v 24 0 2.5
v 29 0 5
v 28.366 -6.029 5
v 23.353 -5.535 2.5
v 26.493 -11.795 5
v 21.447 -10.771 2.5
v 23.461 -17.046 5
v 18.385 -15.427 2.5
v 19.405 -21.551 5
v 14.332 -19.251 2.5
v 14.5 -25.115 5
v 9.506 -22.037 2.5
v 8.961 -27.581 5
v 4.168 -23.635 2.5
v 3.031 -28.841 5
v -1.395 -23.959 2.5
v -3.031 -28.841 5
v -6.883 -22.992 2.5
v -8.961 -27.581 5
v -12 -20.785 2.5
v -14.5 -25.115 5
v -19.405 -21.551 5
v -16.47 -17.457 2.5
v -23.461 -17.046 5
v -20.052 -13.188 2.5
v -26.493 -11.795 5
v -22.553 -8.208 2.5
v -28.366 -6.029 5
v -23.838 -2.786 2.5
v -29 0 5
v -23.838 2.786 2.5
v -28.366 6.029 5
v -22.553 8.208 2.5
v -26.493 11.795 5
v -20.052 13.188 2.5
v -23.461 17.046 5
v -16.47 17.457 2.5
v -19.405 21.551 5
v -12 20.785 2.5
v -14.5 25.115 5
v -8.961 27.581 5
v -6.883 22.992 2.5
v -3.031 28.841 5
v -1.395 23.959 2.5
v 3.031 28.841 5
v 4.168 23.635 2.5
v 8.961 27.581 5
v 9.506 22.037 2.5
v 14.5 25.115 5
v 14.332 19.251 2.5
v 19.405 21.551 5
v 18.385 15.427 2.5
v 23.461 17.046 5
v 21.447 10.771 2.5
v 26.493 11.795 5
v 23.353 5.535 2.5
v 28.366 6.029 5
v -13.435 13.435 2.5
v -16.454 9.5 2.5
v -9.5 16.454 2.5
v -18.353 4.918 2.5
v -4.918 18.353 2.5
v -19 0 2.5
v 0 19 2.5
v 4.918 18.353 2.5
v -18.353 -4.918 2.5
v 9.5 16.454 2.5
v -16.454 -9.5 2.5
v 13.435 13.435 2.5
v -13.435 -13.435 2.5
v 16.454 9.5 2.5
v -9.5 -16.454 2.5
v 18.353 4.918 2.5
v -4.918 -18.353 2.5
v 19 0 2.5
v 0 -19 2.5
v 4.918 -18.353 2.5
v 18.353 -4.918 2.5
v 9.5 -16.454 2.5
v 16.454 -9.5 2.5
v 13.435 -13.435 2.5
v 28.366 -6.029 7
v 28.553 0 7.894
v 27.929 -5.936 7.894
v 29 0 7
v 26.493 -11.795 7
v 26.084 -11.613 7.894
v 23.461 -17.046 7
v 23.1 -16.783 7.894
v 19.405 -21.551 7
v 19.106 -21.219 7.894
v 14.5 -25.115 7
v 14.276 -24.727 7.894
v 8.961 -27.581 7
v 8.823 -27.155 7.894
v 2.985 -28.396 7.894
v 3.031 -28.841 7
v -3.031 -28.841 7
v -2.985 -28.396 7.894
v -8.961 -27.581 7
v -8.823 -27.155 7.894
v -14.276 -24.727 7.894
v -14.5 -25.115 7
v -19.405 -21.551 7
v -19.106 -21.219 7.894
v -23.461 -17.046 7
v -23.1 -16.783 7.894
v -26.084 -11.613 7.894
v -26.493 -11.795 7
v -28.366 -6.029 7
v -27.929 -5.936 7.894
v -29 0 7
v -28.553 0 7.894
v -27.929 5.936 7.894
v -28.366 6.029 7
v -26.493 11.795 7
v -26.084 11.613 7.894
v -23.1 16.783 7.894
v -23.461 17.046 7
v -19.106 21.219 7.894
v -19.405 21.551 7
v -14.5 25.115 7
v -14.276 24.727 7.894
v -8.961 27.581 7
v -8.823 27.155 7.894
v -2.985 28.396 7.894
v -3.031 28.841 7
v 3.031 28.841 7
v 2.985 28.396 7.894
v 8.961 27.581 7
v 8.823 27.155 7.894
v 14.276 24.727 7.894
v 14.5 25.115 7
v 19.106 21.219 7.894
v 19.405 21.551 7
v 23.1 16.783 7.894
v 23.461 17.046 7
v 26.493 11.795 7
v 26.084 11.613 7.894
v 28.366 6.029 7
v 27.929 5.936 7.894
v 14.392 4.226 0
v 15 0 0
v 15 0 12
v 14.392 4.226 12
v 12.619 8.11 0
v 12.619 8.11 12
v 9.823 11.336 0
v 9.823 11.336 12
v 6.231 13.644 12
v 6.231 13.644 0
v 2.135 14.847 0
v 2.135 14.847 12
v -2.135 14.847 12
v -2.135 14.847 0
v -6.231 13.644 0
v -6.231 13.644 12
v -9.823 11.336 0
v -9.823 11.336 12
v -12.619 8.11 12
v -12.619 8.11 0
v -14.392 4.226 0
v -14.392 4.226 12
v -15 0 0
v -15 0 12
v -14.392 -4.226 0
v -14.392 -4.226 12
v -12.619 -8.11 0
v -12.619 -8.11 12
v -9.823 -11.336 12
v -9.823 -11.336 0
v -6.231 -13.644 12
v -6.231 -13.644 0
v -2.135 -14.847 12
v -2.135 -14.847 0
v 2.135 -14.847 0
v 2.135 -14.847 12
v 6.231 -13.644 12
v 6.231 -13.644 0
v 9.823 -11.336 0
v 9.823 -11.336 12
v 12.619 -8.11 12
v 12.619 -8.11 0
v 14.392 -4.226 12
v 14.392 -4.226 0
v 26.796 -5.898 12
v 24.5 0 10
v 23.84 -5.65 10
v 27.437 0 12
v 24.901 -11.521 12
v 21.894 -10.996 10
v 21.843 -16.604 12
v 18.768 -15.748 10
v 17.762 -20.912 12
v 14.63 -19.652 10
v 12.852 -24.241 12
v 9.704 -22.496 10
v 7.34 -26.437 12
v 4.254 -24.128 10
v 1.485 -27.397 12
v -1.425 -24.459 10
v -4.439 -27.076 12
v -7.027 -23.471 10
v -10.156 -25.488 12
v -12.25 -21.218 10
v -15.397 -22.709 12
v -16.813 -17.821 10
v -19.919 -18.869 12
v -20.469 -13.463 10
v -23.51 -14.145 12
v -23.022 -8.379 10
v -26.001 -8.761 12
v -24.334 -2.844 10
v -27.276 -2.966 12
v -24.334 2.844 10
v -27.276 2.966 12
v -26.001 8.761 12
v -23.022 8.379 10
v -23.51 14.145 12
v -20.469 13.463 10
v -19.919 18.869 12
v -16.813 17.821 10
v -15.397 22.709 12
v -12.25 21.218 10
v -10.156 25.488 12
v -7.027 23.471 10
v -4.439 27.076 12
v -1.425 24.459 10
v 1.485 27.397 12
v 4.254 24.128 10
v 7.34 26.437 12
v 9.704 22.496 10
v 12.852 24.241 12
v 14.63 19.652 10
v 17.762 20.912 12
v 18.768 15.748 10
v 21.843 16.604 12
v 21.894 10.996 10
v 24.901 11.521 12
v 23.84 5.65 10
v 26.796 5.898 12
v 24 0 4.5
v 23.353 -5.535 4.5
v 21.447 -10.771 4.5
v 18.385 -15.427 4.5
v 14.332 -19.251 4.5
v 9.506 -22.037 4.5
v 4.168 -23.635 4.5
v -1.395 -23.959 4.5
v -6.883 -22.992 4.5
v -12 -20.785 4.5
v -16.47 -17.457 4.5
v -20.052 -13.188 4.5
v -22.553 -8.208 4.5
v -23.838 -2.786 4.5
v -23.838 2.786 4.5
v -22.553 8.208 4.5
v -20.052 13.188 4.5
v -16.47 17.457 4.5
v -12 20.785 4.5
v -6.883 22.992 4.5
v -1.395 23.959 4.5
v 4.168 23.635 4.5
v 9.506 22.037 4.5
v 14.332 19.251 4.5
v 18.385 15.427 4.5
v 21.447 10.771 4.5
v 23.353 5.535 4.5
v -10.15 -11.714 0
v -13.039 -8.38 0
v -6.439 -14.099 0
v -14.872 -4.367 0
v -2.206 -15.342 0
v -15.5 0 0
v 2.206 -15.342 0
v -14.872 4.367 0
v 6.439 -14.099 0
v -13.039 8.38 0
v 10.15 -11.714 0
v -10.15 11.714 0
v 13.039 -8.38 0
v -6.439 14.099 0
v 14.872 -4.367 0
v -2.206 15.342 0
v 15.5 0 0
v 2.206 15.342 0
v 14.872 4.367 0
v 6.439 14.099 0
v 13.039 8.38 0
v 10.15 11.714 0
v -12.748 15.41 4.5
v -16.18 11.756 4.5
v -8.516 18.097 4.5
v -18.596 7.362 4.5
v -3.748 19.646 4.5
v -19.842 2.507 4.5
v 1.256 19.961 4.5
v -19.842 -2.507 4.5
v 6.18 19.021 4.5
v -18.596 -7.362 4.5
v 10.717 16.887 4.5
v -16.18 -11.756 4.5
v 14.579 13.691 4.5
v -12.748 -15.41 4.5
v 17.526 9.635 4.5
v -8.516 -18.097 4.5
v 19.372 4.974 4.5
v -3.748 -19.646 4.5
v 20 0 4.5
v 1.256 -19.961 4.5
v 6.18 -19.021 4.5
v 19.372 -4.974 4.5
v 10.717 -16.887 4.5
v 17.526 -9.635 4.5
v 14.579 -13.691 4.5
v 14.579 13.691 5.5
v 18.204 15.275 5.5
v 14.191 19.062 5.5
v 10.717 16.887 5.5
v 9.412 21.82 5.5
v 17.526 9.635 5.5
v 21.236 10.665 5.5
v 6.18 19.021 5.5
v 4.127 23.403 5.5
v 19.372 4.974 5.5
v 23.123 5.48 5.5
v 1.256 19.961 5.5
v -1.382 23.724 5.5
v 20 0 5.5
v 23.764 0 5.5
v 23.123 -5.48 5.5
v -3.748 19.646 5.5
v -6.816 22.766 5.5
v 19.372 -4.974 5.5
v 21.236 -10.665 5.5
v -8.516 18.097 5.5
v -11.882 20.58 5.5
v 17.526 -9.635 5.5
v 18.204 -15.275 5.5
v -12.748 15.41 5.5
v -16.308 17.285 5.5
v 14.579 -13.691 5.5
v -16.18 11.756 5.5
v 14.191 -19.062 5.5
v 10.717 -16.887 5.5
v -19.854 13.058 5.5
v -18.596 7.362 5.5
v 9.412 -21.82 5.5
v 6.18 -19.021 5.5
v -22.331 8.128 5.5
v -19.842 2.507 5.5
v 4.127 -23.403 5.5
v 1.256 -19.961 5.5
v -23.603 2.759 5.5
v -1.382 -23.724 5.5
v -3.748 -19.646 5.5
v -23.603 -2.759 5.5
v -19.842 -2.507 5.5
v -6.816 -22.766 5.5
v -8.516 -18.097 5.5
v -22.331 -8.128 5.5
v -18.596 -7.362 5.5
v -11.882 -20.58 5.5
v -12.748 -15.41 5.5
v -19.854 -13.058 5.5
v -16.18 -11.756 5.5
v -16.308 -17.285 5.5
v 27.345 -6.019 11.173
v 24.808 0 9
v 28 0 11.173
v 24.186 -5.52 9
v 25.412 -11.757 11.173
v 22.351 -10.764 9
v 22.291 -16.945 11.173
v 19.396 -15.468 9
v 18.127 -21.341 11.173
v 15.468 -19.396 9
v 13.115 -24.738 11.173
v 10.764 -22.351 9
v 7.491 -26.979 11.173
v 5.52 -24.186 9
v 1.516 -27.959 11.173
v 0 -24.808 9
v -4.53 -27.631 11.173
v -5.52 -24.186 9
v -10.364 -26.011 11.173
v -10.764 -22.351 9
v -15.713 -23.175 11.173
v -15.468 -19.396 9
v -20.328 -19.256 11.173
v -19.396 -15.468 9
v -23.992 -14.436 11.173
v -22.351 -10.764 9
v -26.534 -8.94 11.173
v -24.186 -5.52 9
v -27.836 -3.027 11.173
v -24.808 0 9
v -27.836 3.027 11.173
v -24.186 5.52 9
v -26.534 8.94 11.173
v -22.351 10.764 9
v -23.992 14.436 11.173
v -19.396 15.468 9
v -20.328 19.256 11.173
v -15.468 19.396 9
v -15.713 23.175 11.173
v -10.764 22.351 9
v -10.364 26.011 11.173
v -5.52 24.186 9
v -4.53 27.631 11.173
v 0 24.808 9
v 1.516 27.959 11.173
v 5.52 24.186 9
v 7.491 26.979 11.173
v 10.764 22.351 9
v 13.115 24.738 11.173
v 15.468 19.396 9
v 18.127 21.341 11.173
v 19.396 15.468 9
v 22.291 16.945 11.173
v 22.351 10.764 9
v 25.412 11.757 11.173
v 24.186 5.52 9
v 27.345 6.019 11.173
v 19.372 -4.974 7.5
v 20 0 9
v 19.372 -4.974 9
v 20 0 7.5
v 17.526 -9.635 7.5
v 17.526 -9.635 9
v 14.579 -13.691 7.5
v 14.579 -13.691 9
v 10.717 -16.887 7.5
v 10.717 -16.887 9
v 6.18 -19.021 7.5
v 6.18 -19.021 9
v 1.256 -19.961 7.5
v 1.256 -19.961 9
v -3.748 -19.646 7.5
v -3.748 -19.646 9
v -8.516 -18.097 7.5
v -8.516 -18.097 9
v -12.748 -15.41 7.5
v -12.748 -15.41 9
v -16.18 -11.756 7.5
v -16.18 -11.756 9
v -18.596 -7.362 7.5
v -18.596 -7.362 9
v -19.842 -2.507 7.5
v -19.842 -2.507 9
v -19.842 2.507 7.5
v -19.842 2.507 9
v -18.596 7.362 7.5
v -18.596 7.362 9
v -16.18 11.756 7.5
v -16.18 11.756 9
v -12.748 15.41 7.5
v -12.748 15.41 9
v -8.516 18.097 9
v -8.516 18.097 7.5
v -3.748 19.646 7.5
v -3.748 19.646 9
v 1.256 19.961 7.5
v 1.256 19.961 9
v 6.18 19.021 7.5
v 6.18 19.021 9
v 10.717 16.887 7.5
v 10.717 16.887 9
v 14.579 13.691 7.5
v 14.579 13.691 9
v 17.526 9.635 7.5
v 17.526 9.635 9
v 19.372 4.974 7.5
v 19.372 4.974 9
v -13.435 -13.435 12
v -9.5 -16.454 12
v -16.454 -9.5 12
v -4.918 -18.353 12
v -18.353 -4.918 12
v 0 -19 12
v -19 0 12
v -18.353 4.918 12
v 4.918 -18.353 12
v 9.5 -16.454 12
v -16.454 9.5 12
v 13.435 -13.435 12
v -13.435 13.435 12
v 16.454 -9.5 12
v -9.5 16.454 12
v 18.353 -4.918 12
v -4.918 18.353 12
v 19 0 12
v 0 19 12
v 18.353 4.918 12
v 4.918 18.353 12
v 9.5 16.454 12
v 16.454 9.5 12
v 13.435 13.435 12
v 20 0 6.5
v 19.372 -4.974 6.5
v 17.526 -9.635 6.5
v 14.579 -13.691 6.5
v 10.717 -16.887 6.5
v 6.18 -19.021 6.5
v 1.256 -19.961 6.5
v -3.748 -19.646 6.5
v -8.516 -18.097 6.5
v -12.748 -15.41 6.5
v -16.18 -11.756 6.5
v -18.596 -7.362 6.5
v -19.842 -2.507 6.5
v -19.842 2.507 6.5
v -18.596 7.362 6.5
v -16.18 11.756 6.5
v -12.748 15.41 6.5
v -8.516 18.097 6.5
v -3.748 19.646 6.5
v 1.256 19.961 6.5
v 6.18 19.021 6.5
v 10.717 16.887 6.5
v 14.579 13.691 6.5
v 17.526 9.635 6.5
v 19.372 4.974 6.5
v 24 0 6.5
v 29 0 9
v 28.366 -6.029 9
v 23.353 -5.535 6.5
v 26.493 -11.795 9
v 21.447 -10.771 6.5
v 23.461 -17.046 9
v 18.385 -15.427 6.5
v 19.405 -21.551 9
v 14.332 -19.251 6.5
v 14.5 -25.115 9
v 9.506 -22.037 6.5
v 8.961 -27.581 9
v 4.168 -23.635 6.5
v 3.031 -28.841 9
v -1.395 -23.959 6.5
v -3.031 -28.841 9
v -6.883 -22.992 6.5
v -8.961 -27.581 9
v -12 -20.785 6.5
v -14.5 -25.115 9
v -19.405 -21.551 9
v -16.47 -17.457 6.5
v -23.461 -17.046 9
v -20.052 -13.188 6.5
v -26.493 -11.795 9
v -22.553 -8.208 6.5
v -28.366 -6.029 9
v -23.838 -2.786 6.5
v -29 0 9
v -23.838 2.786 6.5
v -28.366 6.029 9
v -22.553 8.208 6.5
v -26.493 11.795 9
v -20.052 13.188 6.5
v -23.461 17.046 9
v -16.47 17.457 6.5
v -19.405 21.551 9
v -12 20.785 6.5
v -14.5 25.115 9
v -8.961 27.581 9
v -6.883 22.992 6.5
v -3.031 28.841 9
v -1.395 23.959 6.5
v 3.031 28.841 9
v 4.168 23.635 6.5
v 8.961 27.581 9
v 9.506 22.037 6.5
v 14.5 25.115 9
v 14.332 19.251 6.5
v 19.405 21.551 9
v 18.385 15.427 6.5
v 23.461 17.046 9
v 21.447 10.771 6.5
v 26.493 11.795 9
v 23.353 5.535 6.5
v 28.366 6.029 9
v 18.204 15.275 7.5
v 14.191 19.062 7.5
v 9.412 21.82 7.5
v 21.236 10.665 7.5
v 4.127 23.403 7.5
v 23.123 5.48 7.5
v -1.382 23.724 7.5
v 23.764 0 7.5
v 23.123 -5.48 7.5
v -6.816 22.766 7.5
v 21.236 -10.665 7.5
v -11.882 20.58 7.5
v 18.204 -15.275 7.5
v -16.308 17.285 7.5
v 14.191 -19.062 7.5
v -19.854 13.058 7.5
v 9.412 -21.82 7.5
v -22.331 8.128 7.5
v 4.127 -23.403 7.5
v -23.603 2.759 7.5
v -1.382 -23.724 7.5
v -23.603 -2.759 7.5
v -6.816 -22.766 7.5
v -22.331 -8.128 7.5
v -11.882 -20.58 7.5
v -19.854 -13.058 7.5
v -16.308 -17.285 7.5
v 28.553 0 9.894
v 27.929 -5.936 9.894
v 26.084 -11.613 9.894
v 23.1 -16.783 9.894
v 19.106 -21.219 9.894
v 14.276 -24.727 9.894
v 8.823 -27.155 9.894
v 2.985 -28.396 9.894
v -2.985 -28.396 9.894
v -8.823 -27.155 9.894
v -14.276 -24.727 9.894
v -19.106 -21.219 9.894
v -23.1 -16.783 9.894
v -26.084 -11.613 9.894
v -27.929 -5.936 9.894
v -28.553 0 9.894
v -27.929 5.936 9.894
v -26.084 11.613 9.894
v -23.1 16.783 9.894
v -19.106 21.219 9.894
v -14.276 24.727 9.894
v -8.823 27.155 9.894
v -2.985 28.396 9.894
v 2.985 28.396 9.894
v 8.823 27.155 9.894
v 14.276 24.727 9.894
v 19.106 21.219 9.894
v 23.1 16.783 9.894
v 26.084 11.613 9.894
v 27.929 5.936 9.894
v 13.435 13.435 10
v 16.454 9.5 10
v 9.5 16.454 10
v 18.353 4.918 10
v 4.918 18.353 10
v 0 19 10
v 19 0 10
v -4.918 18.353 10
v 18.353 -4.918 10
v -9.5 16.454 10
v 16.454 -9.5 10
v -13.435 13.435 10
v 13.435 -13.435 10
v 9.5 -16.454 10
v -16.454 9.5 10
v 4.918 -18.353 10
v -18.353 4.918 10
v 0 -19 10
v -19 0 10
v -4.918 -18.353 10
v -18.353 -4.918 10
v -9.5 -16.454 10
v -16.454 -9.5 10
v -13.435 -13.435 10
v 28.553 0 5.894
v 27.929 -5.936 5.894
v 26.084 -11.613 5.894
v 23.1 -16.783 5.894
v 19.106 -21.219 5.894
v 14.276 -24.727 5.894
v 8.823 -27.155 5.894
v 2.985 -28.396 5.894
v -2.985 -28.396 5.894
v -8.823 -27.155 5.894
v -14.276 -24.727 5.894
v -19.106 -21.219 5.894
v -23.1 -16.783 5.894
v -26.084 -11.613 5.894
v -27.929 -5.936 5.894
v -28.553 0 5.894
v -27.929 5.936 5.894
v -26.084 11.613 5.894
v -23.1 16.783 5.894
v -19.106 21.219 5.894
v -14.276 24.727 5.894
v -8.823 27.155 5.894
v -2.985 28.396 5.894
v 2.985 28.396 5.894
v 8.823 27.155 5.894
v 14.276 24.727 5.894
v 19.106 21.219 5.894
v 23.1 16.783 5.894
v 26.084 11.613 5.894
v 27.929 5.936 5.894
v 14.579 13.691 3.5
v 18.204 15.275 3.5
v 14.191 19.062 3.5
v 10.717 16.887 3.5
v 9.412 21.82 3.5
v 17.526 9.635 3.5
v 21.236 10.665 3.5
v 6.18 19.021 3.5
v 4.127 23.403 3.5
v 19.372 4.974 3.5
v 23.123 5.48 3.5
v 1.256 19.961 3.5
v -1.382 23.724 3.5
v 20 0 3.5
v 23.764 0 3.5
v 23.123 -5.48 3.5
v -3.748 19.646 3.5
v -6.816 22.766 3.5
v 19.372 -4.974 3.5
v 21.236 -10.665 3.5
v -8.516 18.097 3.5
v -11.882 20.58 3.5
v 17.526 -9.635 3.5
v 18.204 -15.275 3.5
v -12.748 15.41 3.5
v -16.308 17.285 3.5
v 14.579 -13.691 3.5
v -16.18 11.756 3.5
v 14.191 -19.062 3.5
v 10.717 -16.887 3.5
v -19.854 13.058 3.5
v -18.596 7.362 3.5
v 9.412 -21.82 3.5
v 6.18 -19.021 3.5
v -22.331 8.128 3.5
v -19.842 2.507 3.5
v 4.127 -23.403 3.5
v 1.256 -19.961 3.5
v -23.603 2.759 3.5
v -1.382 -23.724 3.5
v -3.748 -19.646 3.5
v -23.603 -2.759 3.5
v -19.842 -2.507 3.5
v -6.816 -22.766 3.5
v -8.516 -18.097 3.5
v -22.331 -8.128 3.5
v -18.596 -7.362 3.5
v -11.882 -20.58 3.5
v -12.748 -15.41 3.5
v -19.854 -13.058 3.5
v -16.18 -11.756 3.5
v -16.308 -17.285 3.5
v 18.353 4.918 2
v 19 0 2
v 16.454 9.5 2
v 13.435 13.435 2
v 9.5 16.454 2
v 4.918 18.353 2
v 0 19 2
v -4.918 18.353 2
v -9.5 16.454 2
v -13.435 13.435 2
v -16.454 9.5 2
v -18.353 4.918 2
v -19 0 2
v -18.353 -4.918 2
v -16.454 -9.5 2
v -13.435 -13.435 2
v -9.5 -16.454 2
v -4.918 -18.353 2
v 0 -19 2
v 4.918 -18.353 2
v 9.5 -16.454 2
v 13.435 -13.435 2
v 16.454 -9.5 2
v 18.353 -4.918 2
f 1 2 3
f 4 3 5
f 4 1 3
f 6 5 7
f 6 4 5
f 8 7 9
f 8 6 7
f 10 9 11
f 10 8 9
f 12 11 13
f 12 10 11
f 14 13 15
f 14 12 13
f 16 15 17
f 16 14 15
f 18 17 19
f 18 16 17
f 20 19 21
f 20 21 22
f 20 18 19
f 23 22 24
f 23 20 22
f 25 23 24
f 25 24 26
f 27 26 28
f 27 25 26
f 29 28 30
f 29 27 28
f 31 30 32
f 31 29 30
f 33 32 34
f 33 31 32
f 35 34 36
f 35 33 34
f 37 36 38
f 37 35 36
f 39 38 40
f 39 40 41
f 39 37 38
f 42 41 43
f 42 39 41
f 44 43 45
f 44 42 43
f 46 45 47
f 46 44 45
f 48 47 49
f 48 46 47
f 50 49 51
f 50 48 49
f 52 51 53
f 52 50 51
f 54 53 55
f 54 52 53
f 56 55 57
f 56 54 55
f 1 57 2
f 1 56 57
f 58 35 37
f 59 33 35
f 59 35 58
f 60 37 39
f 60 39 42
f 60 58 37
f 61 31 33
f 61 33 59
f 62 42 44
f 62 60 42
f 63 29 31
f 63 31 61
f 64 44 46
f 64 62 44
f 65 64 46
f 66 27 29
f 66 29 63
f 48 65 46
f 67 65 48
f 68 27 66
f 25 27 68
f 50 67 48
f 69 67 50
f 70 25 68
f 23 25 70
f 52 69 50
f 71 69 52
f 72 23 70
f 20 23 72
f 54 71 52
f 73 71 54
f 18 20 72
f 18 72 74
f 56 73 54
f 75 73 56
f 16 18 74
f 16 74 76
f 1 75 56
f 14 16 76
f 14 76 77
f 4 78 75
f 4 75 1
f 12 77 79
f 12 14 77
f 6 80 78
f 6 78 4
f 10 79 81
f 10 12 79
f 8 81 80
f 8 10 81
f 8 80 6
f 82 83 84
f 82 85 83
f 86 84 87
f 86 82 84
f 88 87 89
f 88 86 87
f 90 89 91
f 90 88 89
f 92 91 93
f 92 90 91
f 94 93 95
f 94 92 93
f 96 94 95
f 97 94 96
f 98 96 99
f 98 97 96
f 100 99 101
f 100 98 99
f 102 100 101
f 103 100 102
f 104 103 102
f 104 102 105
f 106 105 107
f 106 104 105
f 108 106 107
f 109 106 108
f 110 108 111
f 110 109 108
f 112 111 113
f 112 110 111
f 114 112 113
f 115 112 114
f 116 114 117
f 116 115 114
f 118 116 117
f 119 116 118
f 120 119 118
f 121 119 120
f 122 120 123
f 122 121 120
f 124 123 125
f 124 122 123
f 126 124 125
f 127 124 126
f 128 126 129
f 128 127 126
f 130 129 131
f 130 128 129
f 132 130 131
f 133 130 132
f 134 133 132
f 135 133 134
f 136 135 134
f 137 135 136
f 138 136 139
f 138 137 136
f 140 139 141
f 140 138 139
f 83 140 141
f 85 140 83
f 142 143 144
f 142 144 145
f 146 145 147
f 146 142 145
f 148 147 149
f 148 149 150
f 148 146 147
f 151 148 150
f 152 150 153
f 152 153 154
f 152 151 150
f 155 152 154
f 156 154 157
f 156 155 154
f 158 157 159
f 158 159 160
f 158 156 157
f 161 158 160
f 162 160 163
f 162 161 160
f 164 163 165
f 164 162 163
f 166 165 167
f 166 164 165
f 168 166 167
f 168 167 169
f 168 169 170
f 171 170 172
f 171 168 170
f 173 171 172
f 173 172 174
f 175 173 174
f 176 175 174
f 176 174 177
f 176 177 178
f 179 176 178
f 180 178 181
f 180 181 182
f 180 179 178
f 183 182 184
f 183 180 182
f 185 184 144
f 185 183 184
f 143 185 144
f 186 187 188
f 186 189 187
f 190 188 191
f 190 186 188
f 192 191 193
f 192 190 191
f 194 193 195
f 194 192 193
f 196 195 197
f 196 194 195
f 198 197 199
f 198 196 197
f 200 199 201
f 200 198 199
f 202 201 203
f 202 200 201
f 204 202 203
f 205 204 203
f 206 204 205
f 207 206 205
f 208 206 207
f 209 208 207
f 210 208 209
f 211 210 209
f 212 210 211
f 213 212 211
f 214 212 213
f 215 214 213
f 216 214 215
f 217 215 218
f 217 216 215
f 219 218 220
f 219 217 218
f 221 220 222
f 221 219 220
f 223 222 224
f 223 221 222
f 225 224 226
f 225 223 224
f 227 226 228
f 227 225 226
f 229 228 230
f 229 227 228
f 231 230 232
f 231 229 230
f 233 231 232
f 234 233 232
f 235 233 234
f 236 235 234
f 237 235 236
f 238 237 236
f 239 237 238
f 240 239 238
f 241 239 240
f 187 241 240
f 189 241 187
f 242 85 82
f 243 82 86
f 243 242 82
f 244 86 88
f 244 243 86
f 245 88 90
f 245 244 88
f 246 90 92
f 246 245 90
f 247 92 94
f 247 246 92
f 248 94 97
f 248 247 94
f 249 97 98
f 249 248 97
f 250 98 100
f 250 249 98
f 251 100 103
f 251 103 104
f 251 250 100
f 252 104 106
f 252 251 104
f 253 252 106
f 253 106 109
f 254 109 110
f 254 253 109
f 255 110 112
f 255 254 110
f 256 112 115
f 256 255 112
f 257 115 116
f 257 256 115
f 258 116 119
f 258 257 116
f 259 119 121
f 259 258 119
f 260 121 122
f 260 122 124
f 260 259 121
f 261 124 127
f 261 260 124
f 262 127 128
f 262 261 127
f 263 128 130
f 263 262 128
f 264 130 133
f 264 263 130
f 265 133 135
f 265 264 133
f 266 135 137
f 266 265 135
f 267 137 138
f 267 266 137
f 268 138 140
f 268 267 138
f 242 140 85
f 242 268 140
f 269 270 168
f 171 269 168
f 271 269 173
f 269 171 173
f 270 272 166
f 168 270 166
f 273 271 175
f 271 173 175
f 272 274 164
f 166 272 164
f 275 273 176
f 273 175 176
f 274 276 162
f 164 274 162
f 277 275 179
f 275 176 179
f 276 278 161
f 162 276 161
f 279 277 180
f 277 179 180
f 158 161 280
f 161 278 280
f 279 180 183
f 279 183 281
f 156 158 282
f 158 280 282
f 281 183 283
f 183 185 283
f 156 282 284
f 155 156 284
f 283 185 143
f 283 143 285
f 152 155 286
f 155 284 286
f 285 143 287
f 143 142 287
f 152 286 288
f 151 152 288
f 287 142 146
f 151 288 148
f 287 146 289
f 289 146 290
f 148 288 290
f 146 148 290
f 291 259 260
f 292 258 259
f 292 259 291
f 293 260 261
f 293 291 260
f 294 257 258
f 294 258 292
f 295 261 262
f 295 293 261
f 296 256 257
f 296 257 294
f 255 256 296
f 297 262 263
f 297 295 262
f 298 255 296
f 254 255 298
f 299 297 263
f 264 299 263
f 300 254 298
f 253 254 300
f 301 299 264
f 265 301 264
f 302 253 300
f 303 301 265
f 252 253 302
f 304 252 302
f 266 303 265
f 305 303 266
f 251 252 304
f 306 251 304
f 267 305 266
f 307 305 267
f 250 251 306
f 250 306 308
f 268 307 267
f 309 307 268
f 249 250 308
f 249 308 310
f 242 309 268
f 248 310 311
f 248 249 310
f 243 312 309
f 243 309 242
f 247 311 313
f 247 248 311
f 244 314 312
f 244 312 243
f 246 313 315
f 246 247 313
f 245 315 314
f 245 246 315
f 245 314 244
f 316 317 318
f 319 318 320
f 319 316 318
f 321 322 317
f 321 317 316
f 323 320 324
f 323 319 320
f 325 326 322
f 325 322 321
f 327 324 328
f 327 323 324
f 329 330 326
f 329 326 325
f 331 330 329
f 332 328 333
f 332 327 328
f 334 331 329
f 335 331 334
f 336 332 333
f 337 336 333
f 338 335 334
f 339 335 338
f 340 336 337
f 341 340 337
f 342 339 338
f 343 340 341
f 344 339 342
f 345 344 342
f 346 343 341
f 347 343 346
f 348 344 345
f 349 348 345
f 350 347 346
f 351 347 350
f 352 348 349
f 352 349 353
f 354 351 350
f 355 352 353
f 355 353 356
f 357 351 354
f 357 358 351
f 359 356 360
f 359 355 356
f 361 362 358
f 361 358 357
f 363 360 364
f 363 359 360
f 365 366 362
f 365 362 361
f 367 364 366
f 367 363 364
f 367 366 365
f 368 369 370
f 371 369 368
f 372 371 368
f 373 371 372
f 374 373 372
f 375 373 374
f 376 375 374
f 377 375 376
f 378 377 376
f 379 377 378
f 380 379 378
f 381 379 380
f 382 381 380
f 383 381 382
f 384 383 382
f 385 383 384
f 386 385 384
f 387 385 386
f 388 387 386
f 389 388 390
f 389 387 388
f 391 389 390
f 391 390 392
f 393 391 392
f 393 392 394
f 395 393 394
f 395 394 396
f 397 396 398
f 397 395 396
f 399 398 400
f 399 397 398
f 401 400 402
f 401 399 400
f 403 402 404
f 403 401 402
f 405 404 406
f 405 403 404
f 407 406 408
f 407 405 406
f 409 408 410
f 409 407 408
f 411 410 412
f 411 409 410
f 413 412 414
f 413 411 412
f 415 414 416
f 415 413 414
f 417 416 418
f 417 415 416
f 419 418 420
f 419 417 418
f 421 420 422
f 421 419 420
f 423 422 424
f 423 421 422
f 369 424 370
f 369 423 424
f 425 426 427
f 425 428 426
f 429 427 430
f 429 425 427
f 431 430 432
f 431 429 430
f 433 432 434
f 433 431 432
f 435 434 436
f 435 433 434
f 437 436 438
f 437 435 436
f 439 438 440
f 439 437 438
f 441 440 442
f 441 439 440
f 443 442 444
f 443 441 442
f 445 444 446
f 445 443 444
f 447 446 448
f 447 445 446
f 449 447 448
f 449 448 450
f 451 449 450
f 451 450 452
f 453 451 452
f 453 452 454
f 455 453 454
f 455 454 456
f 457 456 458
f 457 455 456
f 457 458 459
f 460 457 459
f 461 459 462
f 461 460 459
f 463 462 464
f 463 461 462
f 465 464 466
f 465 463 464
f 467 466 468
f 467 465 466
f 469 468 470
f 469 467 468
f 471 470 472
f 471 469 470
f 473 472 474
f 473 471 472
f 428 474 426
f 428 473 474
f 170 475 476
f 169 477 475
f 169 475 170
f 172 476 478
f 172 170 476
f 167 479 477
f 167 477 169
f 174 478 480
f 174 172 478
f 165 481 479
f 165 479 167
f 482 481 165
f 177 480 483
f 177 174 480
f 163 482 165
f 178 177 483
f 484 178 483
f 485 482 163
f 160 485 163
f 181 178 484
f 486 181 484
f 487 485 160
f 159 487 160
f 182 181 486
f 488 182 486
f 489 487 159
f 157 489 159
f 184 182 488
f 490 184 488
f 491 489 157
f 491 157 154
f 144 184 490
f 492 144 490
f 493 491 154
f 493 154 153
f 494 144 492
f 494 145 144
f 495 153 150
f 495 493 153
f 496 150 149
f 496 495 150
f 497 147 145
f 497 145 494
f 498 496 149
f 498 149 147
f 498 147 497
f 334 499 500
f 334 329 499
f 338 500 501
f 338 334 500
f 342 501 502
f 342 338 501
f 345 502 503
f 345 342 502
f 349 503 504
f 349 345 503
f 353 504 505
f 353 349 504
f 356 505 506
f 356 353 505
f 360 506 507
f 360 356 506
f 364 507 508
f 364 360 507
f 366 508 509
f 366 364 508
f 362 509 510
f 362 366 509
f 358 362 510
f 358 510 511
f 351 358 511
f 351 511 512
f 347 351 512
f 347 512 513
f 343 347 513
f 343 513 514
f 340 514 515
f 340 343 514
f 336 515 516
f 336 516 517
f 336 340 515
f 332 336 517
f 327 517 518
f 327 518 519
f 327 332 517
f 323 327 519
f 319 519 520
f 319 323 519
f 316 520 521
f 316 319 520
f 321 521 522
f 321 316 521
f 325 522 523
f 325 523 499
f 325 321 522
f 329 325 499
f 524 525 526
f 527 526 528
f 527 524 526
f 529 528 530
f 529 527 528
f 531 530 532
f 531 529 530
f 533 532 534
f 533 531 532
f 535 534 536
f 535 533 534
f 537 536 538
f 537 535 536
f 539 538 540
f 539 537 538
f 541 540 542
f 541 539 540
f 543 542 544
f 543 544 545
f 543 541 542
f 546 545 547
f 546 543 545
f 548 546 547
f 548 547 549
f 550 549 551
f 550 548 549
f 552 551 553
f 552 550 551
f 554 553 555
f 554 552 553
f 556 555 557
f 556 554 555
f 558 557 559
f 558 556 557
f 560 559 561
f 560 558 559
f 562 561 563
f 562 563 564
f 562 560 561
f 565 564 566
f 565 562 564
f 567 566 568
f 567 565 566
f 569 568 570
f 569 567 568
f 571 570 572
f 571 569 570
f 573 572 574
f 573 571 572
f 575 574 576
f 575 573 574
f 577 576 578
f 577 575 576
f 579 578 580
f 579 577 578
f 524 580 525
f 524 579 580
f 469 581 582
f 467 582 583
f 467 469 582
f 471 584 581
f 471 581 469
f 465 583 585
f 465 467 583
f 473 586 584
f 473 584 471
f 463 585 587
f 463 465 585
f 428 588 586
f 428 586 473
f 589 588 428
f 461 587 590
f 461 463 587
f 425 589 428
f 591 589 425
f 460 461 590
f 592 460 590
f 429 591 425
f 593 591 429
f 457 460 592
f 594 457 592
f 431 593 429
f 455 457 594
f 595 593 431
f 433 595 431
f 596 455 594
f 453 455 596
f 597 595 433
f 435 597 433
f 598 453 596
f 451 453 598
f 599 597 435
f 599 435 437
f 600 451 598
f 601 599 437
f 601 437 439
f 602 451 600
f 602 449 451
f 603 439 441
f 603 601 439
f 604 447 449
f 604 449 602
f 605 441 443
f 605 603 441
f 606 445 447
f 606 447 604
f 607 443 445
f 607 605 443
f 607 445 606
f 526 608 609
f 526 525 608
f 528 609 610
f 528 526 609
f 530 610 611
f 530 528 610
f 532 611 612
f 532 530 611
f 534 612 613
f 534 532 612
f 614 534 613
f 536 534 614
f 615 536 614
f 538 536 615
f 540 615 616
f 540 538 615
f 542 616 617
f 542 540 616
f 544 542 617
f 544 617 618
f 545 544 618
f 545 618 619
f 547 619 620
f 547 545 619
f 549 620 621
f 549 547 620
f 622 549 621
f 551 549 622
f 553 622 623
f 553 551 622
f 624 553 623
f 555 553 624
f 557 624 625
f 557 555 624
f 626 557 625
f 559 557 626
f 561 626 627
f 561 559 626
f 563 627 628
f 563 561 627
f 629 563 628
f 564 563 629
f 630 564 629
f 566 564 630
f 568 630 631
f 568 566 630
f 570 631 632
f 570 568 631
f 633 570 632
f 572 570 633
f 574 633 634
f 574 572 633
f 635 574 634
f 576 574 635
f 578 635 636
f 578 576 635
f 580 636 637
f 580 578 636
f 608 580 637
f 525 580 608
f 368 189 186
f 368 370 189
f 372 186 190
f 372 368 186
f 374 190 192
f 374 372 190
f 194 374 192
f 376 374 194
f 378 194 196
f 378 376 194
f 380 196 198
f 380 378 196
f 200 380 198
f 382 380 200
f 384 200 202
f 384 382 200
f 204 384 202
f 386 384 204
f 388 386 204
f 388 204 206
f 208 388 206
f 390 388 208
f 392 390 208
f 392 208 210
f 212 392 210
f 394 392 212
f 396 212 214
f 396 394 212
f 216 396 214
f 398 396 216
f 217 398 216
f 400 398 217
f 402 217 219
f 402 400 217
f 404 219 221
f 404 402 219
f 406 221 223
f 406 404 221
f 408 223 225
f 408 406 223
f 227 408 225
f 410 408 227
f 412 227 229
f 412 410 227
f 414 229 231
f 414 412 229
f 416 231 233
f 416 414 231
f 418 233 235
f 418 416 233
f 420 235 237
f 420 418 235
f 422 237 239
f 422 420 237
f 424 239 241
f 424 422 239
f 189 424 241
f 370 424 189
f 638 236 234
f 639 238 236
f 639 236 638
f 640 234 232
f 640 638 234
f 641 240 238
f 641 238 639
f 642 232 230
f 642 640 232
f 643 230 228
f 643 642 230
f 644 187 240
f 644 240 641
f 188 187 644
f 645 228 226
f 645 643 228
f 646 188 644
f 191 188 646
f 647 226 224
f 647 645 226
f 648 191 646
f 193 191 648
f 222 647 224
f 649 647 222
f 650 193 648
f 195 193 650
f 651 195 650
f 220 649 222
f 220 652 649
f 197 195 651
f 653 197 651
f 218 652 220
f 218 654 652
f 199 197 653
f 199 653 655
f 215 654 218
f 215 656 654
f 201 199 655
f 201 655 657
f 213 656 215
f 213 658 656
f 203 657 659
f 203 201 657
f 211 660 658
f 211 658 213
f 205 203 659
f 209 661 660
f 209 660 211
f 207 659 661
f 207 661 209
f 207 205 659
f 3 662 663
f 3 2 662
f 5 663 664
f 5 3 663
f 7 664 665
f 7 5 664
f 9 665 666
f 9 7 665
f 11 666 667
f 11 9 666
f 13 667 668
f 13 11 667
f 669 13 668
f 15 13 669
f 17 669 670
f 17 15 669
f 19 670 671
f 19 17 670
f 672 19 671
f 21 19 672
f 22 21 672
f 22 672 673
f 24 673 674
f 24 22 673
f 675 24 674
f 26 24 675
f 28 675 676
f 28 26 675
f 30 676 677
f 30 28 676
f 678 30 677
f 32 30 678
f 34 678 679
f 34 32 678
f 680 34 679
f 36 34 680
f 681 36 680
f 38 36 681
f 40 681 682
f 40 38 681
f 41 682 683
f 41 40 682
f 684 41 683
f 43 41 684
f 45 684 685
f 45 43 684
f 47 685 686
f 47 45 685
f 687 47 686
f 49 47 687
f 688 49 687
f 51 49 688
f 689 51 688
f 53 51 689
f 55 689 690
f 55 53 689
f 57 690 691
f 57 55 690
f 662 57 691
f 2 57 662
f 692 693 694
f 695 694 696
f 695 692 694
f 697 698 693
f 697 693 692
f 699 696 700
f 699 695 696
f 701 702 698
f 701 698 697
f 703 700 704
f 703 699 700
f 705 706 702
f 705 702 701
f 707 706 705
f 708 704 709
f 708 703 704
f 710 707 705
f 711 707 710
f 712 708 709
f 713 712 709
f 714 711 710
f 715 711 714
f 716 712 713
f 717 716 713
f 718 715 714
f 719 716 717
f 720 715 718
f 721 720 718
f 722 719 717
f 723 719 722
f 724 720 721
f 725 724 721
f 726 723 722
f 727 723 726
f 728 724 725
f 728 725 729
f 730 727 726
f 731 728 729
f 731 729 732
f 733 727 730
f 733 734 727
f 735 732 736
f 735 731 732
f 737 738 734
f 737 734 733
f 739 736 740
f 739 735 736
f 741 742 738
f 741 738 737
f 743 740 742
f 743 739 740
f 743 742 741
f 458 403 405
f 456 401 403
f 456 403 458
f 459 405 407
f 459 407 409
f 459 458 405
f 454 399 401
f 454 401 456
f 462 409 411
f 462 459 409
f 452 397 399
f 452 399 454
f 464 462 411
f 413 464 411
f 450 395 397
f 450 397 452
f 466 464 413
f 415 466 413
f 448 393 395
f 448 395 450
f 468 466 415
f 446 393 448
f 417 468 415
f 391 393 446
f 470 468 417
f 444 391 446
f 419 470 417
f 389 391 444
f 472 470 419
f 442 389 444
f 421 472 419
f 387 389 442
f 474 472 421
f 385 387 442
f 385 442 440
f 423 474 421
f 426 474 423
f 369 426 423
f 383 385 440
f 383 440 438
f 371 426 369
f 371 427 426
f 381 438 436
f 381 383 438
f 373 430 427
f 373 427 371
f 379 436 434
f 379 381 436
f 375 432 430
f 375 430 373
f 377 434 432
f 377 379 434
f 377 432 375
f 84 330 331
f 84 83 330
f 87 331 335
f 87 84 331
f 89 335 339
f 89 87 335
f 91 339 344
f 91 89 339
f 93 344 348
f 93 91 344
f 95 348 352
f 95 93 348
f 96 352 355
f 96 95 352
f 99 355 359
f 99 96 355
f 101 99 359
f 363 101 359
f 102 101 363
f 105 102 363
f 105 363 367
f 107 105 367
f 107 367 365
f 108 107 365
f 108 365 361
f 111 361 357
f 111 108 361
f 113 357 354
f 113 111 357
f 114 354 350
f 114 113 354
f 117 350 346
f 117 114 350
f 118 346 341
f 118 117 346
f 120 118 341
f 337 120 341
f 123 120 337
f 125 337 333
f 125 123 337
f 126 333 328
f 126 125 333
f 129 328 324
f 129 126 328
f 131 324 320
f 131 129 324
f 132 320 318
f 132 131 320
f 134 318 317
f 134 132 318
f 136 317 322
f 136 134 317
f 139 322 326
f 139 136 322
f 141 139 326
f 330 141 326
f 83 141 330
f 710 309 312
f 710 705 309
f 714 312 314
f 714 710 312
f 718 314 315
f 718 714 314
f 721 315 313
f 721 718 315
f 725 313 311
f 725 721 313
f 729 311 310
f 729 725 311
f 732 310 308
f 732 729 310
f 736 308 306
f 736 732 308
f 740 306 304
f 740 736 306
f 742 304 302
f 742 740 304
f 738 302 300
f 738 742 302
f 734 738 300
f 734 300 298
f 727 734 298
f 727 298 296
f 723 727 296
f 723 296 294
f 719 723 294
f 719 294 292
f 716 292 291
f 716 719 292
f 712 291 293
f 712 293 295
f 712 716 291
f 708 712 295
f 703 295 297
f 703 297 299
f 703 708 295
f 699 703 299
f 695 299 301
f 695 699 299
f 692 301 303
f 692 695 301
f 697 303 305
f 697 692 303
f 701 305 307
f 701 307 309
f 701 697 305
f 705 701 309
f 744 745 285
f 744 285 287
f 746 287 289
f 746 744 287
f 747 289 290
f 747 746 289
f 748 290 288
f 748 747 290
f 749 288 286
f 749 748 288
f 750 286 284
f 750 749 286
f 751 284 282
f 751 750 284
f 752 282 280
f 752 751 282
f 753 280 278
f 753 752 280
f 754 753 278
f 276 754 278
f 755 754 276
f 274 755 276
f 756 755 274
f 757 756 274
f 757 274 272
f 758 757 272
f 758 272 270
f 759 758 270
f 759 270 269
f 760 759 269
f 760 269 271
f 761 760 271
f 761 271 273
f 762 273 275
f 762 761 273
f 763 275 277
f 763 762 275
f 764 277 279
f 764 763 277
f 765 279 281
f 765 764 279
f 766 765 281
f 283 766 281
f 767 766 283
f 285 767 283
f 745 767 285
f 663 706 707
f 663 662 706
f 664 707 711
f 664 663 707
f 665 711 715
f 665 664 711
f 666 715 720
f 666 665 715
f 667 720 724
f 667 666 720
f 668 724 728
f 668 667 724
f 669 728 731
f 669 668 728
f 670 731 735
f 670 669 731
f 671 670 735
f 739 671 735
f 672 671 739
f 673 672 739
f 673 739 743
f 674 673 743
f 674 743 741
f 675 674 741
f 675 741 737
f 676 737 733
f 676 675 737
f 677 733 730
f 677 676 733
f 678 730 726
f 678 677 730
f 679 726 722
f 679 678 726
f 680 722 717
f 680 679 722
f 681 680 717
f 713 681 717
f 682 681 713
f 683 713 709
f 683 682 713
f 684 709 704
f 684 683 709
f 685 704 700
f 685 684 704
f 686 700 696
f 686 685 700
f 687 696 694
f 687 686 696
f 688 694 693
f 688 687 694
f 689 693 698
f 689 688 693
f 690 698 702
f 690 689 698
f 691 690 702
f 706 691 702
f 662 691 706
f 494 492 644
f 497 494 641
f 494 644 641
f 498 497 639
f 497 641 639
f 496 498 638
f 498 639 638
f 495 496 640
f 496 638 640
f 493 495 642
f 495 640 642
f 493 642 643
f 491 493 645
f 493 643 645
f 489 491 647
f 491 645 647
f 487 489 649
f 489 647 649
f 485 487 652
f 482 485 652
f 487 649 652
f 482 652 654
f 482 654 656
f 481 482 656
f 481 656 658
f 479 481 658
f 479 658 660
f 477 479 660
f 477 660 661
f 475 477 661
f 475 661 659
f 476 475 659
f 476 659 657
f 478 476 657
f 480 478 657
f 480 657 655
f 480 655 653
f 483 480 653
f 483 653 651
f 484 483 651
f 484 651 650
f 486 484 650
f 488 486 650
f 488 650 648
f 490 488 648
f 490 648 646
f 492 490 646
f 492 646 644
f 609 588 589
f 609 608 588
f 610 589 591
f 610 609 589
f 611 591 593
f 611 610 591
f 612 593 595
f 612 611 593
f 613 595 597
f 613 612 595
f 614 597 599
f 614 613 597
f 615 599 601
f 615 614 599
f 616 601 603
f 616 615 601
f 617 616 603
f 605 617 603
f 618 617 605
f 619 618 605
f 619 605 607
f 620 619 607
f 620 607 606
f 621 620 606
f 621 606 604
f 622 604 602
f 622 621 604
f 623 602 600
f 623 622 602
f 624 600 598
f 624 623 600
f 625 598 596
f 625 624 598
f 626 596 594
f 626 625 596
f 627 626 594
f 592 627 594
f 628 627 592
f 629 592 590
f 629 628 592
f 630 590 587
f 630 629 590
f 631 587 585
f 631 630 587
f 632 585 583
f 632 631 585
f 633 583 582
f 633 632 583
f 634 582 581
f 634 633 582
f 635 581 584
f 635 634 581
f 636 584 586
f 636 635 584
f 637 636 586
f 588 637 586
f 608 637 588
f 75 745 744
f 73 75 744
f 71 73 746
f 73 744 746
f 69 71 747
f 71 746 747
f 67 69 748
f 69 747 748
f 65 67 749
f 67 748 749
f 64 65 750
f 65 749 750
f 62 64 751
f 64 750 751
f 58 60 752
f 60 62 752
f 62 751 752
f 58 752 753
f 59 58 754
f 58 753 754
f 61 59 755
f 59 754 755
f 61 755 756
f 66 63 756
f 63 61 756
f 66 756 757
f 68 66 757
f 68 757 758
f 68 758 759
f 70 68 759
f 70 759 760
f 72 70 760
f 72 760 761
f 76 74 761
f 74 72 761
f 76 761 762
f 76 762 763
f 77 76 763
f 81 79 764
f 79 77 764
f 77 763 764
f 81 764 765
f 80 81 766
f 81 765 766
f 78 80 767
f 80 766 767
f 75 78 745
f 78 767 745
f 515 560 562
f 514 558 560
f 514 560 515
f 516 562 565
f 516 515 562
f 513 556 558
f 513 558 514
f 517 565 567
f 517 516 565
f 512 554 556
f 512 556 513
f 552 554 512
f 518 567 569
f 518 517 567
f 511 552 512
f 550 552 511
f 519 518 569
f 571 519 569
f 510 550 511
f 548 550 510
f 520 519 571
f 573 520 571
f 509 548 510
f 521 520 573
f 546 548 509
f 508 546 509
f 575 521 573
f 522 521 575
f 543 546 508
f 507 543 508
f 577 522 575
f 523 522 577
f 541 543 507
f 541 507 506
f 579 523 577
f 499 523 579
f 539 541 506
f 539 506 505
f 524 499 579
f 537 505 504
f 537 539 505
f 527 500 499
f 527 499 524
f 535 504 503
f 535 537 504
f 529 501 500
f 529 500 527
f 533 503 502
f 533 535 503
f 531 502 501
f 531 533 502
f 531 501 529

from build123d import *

# Parameters (mm, degrees)
ESBO_O1_R           = 19
ESBO_O1_R_2         = 15
CONTRA_CENTRO_DEPTH = 12
CHANFRO1_SIZE       = 3.5
CHANFRO1_SIZE2      = 2


with BuildPart() as part:
    # Esboço1 → CONTRA CENTRO (new body)
    with BuildSketch(Plane.XY):
        Circle(ESBO_O1_R)
        Circle(ESBO_O1_R_2, mode=Mode.SUBTRACT)
    extrude(amount=CONTRA_CENTRO_DEPTH)

    # Chanfro1
    chanfro1_edges = [part.edges().sort_by_distance(p)[0] for p in [
        (-19, 0, 0),
    ]]
    chanfro1_side = [part.faces().sort_by_distance(p)[0] for p in [
        (-18.462598846, 0, 0),
    ]]
    chamfer(chanfro1_edges, length=CHANFRO1_SIZE, length2=CHANFRO1_SIZE2, reference=chanfro1_side[0])

    # Esboço2 → AA26234 (revolve)
    with BuildSketch(Plane(origin=(0, 0, 0), x_dir=(0, 0, -1), z_dir=(1, 0, 0)), mode=Mode.PRIVATE) as aa26234_sk:
        Polygon((-2.5, 19), (-10, 19), (-10, 24.5), (-12, 27.437165192), (-11.173430596, 28), (-9, 24.808137652), (-9, 20), (-7.5, 20), (-7.5, 23.763932023), (-9.894427191, 28.552786405), (-9, 29), (-6.5, 24), (-6.5, 20), (-5.5, 20), (-5.5, 23.763932023), (-7.894427191, 28.552786405), (-7, 29), (-4.5, 24), (-4.5, 20), (-3.5, 20), (-3.5, 23.763932023), (-5.894427191, 28.552786405), (-5, 29), (-2.5, 24), align=None)
    revolve(aa26234_sk.sketch.rotate(Axis((0, 0, 10), (0, 0, -1)), 90), axis=Axis((0, 0, 10), (0, 0, -1)))


solid = part.part
